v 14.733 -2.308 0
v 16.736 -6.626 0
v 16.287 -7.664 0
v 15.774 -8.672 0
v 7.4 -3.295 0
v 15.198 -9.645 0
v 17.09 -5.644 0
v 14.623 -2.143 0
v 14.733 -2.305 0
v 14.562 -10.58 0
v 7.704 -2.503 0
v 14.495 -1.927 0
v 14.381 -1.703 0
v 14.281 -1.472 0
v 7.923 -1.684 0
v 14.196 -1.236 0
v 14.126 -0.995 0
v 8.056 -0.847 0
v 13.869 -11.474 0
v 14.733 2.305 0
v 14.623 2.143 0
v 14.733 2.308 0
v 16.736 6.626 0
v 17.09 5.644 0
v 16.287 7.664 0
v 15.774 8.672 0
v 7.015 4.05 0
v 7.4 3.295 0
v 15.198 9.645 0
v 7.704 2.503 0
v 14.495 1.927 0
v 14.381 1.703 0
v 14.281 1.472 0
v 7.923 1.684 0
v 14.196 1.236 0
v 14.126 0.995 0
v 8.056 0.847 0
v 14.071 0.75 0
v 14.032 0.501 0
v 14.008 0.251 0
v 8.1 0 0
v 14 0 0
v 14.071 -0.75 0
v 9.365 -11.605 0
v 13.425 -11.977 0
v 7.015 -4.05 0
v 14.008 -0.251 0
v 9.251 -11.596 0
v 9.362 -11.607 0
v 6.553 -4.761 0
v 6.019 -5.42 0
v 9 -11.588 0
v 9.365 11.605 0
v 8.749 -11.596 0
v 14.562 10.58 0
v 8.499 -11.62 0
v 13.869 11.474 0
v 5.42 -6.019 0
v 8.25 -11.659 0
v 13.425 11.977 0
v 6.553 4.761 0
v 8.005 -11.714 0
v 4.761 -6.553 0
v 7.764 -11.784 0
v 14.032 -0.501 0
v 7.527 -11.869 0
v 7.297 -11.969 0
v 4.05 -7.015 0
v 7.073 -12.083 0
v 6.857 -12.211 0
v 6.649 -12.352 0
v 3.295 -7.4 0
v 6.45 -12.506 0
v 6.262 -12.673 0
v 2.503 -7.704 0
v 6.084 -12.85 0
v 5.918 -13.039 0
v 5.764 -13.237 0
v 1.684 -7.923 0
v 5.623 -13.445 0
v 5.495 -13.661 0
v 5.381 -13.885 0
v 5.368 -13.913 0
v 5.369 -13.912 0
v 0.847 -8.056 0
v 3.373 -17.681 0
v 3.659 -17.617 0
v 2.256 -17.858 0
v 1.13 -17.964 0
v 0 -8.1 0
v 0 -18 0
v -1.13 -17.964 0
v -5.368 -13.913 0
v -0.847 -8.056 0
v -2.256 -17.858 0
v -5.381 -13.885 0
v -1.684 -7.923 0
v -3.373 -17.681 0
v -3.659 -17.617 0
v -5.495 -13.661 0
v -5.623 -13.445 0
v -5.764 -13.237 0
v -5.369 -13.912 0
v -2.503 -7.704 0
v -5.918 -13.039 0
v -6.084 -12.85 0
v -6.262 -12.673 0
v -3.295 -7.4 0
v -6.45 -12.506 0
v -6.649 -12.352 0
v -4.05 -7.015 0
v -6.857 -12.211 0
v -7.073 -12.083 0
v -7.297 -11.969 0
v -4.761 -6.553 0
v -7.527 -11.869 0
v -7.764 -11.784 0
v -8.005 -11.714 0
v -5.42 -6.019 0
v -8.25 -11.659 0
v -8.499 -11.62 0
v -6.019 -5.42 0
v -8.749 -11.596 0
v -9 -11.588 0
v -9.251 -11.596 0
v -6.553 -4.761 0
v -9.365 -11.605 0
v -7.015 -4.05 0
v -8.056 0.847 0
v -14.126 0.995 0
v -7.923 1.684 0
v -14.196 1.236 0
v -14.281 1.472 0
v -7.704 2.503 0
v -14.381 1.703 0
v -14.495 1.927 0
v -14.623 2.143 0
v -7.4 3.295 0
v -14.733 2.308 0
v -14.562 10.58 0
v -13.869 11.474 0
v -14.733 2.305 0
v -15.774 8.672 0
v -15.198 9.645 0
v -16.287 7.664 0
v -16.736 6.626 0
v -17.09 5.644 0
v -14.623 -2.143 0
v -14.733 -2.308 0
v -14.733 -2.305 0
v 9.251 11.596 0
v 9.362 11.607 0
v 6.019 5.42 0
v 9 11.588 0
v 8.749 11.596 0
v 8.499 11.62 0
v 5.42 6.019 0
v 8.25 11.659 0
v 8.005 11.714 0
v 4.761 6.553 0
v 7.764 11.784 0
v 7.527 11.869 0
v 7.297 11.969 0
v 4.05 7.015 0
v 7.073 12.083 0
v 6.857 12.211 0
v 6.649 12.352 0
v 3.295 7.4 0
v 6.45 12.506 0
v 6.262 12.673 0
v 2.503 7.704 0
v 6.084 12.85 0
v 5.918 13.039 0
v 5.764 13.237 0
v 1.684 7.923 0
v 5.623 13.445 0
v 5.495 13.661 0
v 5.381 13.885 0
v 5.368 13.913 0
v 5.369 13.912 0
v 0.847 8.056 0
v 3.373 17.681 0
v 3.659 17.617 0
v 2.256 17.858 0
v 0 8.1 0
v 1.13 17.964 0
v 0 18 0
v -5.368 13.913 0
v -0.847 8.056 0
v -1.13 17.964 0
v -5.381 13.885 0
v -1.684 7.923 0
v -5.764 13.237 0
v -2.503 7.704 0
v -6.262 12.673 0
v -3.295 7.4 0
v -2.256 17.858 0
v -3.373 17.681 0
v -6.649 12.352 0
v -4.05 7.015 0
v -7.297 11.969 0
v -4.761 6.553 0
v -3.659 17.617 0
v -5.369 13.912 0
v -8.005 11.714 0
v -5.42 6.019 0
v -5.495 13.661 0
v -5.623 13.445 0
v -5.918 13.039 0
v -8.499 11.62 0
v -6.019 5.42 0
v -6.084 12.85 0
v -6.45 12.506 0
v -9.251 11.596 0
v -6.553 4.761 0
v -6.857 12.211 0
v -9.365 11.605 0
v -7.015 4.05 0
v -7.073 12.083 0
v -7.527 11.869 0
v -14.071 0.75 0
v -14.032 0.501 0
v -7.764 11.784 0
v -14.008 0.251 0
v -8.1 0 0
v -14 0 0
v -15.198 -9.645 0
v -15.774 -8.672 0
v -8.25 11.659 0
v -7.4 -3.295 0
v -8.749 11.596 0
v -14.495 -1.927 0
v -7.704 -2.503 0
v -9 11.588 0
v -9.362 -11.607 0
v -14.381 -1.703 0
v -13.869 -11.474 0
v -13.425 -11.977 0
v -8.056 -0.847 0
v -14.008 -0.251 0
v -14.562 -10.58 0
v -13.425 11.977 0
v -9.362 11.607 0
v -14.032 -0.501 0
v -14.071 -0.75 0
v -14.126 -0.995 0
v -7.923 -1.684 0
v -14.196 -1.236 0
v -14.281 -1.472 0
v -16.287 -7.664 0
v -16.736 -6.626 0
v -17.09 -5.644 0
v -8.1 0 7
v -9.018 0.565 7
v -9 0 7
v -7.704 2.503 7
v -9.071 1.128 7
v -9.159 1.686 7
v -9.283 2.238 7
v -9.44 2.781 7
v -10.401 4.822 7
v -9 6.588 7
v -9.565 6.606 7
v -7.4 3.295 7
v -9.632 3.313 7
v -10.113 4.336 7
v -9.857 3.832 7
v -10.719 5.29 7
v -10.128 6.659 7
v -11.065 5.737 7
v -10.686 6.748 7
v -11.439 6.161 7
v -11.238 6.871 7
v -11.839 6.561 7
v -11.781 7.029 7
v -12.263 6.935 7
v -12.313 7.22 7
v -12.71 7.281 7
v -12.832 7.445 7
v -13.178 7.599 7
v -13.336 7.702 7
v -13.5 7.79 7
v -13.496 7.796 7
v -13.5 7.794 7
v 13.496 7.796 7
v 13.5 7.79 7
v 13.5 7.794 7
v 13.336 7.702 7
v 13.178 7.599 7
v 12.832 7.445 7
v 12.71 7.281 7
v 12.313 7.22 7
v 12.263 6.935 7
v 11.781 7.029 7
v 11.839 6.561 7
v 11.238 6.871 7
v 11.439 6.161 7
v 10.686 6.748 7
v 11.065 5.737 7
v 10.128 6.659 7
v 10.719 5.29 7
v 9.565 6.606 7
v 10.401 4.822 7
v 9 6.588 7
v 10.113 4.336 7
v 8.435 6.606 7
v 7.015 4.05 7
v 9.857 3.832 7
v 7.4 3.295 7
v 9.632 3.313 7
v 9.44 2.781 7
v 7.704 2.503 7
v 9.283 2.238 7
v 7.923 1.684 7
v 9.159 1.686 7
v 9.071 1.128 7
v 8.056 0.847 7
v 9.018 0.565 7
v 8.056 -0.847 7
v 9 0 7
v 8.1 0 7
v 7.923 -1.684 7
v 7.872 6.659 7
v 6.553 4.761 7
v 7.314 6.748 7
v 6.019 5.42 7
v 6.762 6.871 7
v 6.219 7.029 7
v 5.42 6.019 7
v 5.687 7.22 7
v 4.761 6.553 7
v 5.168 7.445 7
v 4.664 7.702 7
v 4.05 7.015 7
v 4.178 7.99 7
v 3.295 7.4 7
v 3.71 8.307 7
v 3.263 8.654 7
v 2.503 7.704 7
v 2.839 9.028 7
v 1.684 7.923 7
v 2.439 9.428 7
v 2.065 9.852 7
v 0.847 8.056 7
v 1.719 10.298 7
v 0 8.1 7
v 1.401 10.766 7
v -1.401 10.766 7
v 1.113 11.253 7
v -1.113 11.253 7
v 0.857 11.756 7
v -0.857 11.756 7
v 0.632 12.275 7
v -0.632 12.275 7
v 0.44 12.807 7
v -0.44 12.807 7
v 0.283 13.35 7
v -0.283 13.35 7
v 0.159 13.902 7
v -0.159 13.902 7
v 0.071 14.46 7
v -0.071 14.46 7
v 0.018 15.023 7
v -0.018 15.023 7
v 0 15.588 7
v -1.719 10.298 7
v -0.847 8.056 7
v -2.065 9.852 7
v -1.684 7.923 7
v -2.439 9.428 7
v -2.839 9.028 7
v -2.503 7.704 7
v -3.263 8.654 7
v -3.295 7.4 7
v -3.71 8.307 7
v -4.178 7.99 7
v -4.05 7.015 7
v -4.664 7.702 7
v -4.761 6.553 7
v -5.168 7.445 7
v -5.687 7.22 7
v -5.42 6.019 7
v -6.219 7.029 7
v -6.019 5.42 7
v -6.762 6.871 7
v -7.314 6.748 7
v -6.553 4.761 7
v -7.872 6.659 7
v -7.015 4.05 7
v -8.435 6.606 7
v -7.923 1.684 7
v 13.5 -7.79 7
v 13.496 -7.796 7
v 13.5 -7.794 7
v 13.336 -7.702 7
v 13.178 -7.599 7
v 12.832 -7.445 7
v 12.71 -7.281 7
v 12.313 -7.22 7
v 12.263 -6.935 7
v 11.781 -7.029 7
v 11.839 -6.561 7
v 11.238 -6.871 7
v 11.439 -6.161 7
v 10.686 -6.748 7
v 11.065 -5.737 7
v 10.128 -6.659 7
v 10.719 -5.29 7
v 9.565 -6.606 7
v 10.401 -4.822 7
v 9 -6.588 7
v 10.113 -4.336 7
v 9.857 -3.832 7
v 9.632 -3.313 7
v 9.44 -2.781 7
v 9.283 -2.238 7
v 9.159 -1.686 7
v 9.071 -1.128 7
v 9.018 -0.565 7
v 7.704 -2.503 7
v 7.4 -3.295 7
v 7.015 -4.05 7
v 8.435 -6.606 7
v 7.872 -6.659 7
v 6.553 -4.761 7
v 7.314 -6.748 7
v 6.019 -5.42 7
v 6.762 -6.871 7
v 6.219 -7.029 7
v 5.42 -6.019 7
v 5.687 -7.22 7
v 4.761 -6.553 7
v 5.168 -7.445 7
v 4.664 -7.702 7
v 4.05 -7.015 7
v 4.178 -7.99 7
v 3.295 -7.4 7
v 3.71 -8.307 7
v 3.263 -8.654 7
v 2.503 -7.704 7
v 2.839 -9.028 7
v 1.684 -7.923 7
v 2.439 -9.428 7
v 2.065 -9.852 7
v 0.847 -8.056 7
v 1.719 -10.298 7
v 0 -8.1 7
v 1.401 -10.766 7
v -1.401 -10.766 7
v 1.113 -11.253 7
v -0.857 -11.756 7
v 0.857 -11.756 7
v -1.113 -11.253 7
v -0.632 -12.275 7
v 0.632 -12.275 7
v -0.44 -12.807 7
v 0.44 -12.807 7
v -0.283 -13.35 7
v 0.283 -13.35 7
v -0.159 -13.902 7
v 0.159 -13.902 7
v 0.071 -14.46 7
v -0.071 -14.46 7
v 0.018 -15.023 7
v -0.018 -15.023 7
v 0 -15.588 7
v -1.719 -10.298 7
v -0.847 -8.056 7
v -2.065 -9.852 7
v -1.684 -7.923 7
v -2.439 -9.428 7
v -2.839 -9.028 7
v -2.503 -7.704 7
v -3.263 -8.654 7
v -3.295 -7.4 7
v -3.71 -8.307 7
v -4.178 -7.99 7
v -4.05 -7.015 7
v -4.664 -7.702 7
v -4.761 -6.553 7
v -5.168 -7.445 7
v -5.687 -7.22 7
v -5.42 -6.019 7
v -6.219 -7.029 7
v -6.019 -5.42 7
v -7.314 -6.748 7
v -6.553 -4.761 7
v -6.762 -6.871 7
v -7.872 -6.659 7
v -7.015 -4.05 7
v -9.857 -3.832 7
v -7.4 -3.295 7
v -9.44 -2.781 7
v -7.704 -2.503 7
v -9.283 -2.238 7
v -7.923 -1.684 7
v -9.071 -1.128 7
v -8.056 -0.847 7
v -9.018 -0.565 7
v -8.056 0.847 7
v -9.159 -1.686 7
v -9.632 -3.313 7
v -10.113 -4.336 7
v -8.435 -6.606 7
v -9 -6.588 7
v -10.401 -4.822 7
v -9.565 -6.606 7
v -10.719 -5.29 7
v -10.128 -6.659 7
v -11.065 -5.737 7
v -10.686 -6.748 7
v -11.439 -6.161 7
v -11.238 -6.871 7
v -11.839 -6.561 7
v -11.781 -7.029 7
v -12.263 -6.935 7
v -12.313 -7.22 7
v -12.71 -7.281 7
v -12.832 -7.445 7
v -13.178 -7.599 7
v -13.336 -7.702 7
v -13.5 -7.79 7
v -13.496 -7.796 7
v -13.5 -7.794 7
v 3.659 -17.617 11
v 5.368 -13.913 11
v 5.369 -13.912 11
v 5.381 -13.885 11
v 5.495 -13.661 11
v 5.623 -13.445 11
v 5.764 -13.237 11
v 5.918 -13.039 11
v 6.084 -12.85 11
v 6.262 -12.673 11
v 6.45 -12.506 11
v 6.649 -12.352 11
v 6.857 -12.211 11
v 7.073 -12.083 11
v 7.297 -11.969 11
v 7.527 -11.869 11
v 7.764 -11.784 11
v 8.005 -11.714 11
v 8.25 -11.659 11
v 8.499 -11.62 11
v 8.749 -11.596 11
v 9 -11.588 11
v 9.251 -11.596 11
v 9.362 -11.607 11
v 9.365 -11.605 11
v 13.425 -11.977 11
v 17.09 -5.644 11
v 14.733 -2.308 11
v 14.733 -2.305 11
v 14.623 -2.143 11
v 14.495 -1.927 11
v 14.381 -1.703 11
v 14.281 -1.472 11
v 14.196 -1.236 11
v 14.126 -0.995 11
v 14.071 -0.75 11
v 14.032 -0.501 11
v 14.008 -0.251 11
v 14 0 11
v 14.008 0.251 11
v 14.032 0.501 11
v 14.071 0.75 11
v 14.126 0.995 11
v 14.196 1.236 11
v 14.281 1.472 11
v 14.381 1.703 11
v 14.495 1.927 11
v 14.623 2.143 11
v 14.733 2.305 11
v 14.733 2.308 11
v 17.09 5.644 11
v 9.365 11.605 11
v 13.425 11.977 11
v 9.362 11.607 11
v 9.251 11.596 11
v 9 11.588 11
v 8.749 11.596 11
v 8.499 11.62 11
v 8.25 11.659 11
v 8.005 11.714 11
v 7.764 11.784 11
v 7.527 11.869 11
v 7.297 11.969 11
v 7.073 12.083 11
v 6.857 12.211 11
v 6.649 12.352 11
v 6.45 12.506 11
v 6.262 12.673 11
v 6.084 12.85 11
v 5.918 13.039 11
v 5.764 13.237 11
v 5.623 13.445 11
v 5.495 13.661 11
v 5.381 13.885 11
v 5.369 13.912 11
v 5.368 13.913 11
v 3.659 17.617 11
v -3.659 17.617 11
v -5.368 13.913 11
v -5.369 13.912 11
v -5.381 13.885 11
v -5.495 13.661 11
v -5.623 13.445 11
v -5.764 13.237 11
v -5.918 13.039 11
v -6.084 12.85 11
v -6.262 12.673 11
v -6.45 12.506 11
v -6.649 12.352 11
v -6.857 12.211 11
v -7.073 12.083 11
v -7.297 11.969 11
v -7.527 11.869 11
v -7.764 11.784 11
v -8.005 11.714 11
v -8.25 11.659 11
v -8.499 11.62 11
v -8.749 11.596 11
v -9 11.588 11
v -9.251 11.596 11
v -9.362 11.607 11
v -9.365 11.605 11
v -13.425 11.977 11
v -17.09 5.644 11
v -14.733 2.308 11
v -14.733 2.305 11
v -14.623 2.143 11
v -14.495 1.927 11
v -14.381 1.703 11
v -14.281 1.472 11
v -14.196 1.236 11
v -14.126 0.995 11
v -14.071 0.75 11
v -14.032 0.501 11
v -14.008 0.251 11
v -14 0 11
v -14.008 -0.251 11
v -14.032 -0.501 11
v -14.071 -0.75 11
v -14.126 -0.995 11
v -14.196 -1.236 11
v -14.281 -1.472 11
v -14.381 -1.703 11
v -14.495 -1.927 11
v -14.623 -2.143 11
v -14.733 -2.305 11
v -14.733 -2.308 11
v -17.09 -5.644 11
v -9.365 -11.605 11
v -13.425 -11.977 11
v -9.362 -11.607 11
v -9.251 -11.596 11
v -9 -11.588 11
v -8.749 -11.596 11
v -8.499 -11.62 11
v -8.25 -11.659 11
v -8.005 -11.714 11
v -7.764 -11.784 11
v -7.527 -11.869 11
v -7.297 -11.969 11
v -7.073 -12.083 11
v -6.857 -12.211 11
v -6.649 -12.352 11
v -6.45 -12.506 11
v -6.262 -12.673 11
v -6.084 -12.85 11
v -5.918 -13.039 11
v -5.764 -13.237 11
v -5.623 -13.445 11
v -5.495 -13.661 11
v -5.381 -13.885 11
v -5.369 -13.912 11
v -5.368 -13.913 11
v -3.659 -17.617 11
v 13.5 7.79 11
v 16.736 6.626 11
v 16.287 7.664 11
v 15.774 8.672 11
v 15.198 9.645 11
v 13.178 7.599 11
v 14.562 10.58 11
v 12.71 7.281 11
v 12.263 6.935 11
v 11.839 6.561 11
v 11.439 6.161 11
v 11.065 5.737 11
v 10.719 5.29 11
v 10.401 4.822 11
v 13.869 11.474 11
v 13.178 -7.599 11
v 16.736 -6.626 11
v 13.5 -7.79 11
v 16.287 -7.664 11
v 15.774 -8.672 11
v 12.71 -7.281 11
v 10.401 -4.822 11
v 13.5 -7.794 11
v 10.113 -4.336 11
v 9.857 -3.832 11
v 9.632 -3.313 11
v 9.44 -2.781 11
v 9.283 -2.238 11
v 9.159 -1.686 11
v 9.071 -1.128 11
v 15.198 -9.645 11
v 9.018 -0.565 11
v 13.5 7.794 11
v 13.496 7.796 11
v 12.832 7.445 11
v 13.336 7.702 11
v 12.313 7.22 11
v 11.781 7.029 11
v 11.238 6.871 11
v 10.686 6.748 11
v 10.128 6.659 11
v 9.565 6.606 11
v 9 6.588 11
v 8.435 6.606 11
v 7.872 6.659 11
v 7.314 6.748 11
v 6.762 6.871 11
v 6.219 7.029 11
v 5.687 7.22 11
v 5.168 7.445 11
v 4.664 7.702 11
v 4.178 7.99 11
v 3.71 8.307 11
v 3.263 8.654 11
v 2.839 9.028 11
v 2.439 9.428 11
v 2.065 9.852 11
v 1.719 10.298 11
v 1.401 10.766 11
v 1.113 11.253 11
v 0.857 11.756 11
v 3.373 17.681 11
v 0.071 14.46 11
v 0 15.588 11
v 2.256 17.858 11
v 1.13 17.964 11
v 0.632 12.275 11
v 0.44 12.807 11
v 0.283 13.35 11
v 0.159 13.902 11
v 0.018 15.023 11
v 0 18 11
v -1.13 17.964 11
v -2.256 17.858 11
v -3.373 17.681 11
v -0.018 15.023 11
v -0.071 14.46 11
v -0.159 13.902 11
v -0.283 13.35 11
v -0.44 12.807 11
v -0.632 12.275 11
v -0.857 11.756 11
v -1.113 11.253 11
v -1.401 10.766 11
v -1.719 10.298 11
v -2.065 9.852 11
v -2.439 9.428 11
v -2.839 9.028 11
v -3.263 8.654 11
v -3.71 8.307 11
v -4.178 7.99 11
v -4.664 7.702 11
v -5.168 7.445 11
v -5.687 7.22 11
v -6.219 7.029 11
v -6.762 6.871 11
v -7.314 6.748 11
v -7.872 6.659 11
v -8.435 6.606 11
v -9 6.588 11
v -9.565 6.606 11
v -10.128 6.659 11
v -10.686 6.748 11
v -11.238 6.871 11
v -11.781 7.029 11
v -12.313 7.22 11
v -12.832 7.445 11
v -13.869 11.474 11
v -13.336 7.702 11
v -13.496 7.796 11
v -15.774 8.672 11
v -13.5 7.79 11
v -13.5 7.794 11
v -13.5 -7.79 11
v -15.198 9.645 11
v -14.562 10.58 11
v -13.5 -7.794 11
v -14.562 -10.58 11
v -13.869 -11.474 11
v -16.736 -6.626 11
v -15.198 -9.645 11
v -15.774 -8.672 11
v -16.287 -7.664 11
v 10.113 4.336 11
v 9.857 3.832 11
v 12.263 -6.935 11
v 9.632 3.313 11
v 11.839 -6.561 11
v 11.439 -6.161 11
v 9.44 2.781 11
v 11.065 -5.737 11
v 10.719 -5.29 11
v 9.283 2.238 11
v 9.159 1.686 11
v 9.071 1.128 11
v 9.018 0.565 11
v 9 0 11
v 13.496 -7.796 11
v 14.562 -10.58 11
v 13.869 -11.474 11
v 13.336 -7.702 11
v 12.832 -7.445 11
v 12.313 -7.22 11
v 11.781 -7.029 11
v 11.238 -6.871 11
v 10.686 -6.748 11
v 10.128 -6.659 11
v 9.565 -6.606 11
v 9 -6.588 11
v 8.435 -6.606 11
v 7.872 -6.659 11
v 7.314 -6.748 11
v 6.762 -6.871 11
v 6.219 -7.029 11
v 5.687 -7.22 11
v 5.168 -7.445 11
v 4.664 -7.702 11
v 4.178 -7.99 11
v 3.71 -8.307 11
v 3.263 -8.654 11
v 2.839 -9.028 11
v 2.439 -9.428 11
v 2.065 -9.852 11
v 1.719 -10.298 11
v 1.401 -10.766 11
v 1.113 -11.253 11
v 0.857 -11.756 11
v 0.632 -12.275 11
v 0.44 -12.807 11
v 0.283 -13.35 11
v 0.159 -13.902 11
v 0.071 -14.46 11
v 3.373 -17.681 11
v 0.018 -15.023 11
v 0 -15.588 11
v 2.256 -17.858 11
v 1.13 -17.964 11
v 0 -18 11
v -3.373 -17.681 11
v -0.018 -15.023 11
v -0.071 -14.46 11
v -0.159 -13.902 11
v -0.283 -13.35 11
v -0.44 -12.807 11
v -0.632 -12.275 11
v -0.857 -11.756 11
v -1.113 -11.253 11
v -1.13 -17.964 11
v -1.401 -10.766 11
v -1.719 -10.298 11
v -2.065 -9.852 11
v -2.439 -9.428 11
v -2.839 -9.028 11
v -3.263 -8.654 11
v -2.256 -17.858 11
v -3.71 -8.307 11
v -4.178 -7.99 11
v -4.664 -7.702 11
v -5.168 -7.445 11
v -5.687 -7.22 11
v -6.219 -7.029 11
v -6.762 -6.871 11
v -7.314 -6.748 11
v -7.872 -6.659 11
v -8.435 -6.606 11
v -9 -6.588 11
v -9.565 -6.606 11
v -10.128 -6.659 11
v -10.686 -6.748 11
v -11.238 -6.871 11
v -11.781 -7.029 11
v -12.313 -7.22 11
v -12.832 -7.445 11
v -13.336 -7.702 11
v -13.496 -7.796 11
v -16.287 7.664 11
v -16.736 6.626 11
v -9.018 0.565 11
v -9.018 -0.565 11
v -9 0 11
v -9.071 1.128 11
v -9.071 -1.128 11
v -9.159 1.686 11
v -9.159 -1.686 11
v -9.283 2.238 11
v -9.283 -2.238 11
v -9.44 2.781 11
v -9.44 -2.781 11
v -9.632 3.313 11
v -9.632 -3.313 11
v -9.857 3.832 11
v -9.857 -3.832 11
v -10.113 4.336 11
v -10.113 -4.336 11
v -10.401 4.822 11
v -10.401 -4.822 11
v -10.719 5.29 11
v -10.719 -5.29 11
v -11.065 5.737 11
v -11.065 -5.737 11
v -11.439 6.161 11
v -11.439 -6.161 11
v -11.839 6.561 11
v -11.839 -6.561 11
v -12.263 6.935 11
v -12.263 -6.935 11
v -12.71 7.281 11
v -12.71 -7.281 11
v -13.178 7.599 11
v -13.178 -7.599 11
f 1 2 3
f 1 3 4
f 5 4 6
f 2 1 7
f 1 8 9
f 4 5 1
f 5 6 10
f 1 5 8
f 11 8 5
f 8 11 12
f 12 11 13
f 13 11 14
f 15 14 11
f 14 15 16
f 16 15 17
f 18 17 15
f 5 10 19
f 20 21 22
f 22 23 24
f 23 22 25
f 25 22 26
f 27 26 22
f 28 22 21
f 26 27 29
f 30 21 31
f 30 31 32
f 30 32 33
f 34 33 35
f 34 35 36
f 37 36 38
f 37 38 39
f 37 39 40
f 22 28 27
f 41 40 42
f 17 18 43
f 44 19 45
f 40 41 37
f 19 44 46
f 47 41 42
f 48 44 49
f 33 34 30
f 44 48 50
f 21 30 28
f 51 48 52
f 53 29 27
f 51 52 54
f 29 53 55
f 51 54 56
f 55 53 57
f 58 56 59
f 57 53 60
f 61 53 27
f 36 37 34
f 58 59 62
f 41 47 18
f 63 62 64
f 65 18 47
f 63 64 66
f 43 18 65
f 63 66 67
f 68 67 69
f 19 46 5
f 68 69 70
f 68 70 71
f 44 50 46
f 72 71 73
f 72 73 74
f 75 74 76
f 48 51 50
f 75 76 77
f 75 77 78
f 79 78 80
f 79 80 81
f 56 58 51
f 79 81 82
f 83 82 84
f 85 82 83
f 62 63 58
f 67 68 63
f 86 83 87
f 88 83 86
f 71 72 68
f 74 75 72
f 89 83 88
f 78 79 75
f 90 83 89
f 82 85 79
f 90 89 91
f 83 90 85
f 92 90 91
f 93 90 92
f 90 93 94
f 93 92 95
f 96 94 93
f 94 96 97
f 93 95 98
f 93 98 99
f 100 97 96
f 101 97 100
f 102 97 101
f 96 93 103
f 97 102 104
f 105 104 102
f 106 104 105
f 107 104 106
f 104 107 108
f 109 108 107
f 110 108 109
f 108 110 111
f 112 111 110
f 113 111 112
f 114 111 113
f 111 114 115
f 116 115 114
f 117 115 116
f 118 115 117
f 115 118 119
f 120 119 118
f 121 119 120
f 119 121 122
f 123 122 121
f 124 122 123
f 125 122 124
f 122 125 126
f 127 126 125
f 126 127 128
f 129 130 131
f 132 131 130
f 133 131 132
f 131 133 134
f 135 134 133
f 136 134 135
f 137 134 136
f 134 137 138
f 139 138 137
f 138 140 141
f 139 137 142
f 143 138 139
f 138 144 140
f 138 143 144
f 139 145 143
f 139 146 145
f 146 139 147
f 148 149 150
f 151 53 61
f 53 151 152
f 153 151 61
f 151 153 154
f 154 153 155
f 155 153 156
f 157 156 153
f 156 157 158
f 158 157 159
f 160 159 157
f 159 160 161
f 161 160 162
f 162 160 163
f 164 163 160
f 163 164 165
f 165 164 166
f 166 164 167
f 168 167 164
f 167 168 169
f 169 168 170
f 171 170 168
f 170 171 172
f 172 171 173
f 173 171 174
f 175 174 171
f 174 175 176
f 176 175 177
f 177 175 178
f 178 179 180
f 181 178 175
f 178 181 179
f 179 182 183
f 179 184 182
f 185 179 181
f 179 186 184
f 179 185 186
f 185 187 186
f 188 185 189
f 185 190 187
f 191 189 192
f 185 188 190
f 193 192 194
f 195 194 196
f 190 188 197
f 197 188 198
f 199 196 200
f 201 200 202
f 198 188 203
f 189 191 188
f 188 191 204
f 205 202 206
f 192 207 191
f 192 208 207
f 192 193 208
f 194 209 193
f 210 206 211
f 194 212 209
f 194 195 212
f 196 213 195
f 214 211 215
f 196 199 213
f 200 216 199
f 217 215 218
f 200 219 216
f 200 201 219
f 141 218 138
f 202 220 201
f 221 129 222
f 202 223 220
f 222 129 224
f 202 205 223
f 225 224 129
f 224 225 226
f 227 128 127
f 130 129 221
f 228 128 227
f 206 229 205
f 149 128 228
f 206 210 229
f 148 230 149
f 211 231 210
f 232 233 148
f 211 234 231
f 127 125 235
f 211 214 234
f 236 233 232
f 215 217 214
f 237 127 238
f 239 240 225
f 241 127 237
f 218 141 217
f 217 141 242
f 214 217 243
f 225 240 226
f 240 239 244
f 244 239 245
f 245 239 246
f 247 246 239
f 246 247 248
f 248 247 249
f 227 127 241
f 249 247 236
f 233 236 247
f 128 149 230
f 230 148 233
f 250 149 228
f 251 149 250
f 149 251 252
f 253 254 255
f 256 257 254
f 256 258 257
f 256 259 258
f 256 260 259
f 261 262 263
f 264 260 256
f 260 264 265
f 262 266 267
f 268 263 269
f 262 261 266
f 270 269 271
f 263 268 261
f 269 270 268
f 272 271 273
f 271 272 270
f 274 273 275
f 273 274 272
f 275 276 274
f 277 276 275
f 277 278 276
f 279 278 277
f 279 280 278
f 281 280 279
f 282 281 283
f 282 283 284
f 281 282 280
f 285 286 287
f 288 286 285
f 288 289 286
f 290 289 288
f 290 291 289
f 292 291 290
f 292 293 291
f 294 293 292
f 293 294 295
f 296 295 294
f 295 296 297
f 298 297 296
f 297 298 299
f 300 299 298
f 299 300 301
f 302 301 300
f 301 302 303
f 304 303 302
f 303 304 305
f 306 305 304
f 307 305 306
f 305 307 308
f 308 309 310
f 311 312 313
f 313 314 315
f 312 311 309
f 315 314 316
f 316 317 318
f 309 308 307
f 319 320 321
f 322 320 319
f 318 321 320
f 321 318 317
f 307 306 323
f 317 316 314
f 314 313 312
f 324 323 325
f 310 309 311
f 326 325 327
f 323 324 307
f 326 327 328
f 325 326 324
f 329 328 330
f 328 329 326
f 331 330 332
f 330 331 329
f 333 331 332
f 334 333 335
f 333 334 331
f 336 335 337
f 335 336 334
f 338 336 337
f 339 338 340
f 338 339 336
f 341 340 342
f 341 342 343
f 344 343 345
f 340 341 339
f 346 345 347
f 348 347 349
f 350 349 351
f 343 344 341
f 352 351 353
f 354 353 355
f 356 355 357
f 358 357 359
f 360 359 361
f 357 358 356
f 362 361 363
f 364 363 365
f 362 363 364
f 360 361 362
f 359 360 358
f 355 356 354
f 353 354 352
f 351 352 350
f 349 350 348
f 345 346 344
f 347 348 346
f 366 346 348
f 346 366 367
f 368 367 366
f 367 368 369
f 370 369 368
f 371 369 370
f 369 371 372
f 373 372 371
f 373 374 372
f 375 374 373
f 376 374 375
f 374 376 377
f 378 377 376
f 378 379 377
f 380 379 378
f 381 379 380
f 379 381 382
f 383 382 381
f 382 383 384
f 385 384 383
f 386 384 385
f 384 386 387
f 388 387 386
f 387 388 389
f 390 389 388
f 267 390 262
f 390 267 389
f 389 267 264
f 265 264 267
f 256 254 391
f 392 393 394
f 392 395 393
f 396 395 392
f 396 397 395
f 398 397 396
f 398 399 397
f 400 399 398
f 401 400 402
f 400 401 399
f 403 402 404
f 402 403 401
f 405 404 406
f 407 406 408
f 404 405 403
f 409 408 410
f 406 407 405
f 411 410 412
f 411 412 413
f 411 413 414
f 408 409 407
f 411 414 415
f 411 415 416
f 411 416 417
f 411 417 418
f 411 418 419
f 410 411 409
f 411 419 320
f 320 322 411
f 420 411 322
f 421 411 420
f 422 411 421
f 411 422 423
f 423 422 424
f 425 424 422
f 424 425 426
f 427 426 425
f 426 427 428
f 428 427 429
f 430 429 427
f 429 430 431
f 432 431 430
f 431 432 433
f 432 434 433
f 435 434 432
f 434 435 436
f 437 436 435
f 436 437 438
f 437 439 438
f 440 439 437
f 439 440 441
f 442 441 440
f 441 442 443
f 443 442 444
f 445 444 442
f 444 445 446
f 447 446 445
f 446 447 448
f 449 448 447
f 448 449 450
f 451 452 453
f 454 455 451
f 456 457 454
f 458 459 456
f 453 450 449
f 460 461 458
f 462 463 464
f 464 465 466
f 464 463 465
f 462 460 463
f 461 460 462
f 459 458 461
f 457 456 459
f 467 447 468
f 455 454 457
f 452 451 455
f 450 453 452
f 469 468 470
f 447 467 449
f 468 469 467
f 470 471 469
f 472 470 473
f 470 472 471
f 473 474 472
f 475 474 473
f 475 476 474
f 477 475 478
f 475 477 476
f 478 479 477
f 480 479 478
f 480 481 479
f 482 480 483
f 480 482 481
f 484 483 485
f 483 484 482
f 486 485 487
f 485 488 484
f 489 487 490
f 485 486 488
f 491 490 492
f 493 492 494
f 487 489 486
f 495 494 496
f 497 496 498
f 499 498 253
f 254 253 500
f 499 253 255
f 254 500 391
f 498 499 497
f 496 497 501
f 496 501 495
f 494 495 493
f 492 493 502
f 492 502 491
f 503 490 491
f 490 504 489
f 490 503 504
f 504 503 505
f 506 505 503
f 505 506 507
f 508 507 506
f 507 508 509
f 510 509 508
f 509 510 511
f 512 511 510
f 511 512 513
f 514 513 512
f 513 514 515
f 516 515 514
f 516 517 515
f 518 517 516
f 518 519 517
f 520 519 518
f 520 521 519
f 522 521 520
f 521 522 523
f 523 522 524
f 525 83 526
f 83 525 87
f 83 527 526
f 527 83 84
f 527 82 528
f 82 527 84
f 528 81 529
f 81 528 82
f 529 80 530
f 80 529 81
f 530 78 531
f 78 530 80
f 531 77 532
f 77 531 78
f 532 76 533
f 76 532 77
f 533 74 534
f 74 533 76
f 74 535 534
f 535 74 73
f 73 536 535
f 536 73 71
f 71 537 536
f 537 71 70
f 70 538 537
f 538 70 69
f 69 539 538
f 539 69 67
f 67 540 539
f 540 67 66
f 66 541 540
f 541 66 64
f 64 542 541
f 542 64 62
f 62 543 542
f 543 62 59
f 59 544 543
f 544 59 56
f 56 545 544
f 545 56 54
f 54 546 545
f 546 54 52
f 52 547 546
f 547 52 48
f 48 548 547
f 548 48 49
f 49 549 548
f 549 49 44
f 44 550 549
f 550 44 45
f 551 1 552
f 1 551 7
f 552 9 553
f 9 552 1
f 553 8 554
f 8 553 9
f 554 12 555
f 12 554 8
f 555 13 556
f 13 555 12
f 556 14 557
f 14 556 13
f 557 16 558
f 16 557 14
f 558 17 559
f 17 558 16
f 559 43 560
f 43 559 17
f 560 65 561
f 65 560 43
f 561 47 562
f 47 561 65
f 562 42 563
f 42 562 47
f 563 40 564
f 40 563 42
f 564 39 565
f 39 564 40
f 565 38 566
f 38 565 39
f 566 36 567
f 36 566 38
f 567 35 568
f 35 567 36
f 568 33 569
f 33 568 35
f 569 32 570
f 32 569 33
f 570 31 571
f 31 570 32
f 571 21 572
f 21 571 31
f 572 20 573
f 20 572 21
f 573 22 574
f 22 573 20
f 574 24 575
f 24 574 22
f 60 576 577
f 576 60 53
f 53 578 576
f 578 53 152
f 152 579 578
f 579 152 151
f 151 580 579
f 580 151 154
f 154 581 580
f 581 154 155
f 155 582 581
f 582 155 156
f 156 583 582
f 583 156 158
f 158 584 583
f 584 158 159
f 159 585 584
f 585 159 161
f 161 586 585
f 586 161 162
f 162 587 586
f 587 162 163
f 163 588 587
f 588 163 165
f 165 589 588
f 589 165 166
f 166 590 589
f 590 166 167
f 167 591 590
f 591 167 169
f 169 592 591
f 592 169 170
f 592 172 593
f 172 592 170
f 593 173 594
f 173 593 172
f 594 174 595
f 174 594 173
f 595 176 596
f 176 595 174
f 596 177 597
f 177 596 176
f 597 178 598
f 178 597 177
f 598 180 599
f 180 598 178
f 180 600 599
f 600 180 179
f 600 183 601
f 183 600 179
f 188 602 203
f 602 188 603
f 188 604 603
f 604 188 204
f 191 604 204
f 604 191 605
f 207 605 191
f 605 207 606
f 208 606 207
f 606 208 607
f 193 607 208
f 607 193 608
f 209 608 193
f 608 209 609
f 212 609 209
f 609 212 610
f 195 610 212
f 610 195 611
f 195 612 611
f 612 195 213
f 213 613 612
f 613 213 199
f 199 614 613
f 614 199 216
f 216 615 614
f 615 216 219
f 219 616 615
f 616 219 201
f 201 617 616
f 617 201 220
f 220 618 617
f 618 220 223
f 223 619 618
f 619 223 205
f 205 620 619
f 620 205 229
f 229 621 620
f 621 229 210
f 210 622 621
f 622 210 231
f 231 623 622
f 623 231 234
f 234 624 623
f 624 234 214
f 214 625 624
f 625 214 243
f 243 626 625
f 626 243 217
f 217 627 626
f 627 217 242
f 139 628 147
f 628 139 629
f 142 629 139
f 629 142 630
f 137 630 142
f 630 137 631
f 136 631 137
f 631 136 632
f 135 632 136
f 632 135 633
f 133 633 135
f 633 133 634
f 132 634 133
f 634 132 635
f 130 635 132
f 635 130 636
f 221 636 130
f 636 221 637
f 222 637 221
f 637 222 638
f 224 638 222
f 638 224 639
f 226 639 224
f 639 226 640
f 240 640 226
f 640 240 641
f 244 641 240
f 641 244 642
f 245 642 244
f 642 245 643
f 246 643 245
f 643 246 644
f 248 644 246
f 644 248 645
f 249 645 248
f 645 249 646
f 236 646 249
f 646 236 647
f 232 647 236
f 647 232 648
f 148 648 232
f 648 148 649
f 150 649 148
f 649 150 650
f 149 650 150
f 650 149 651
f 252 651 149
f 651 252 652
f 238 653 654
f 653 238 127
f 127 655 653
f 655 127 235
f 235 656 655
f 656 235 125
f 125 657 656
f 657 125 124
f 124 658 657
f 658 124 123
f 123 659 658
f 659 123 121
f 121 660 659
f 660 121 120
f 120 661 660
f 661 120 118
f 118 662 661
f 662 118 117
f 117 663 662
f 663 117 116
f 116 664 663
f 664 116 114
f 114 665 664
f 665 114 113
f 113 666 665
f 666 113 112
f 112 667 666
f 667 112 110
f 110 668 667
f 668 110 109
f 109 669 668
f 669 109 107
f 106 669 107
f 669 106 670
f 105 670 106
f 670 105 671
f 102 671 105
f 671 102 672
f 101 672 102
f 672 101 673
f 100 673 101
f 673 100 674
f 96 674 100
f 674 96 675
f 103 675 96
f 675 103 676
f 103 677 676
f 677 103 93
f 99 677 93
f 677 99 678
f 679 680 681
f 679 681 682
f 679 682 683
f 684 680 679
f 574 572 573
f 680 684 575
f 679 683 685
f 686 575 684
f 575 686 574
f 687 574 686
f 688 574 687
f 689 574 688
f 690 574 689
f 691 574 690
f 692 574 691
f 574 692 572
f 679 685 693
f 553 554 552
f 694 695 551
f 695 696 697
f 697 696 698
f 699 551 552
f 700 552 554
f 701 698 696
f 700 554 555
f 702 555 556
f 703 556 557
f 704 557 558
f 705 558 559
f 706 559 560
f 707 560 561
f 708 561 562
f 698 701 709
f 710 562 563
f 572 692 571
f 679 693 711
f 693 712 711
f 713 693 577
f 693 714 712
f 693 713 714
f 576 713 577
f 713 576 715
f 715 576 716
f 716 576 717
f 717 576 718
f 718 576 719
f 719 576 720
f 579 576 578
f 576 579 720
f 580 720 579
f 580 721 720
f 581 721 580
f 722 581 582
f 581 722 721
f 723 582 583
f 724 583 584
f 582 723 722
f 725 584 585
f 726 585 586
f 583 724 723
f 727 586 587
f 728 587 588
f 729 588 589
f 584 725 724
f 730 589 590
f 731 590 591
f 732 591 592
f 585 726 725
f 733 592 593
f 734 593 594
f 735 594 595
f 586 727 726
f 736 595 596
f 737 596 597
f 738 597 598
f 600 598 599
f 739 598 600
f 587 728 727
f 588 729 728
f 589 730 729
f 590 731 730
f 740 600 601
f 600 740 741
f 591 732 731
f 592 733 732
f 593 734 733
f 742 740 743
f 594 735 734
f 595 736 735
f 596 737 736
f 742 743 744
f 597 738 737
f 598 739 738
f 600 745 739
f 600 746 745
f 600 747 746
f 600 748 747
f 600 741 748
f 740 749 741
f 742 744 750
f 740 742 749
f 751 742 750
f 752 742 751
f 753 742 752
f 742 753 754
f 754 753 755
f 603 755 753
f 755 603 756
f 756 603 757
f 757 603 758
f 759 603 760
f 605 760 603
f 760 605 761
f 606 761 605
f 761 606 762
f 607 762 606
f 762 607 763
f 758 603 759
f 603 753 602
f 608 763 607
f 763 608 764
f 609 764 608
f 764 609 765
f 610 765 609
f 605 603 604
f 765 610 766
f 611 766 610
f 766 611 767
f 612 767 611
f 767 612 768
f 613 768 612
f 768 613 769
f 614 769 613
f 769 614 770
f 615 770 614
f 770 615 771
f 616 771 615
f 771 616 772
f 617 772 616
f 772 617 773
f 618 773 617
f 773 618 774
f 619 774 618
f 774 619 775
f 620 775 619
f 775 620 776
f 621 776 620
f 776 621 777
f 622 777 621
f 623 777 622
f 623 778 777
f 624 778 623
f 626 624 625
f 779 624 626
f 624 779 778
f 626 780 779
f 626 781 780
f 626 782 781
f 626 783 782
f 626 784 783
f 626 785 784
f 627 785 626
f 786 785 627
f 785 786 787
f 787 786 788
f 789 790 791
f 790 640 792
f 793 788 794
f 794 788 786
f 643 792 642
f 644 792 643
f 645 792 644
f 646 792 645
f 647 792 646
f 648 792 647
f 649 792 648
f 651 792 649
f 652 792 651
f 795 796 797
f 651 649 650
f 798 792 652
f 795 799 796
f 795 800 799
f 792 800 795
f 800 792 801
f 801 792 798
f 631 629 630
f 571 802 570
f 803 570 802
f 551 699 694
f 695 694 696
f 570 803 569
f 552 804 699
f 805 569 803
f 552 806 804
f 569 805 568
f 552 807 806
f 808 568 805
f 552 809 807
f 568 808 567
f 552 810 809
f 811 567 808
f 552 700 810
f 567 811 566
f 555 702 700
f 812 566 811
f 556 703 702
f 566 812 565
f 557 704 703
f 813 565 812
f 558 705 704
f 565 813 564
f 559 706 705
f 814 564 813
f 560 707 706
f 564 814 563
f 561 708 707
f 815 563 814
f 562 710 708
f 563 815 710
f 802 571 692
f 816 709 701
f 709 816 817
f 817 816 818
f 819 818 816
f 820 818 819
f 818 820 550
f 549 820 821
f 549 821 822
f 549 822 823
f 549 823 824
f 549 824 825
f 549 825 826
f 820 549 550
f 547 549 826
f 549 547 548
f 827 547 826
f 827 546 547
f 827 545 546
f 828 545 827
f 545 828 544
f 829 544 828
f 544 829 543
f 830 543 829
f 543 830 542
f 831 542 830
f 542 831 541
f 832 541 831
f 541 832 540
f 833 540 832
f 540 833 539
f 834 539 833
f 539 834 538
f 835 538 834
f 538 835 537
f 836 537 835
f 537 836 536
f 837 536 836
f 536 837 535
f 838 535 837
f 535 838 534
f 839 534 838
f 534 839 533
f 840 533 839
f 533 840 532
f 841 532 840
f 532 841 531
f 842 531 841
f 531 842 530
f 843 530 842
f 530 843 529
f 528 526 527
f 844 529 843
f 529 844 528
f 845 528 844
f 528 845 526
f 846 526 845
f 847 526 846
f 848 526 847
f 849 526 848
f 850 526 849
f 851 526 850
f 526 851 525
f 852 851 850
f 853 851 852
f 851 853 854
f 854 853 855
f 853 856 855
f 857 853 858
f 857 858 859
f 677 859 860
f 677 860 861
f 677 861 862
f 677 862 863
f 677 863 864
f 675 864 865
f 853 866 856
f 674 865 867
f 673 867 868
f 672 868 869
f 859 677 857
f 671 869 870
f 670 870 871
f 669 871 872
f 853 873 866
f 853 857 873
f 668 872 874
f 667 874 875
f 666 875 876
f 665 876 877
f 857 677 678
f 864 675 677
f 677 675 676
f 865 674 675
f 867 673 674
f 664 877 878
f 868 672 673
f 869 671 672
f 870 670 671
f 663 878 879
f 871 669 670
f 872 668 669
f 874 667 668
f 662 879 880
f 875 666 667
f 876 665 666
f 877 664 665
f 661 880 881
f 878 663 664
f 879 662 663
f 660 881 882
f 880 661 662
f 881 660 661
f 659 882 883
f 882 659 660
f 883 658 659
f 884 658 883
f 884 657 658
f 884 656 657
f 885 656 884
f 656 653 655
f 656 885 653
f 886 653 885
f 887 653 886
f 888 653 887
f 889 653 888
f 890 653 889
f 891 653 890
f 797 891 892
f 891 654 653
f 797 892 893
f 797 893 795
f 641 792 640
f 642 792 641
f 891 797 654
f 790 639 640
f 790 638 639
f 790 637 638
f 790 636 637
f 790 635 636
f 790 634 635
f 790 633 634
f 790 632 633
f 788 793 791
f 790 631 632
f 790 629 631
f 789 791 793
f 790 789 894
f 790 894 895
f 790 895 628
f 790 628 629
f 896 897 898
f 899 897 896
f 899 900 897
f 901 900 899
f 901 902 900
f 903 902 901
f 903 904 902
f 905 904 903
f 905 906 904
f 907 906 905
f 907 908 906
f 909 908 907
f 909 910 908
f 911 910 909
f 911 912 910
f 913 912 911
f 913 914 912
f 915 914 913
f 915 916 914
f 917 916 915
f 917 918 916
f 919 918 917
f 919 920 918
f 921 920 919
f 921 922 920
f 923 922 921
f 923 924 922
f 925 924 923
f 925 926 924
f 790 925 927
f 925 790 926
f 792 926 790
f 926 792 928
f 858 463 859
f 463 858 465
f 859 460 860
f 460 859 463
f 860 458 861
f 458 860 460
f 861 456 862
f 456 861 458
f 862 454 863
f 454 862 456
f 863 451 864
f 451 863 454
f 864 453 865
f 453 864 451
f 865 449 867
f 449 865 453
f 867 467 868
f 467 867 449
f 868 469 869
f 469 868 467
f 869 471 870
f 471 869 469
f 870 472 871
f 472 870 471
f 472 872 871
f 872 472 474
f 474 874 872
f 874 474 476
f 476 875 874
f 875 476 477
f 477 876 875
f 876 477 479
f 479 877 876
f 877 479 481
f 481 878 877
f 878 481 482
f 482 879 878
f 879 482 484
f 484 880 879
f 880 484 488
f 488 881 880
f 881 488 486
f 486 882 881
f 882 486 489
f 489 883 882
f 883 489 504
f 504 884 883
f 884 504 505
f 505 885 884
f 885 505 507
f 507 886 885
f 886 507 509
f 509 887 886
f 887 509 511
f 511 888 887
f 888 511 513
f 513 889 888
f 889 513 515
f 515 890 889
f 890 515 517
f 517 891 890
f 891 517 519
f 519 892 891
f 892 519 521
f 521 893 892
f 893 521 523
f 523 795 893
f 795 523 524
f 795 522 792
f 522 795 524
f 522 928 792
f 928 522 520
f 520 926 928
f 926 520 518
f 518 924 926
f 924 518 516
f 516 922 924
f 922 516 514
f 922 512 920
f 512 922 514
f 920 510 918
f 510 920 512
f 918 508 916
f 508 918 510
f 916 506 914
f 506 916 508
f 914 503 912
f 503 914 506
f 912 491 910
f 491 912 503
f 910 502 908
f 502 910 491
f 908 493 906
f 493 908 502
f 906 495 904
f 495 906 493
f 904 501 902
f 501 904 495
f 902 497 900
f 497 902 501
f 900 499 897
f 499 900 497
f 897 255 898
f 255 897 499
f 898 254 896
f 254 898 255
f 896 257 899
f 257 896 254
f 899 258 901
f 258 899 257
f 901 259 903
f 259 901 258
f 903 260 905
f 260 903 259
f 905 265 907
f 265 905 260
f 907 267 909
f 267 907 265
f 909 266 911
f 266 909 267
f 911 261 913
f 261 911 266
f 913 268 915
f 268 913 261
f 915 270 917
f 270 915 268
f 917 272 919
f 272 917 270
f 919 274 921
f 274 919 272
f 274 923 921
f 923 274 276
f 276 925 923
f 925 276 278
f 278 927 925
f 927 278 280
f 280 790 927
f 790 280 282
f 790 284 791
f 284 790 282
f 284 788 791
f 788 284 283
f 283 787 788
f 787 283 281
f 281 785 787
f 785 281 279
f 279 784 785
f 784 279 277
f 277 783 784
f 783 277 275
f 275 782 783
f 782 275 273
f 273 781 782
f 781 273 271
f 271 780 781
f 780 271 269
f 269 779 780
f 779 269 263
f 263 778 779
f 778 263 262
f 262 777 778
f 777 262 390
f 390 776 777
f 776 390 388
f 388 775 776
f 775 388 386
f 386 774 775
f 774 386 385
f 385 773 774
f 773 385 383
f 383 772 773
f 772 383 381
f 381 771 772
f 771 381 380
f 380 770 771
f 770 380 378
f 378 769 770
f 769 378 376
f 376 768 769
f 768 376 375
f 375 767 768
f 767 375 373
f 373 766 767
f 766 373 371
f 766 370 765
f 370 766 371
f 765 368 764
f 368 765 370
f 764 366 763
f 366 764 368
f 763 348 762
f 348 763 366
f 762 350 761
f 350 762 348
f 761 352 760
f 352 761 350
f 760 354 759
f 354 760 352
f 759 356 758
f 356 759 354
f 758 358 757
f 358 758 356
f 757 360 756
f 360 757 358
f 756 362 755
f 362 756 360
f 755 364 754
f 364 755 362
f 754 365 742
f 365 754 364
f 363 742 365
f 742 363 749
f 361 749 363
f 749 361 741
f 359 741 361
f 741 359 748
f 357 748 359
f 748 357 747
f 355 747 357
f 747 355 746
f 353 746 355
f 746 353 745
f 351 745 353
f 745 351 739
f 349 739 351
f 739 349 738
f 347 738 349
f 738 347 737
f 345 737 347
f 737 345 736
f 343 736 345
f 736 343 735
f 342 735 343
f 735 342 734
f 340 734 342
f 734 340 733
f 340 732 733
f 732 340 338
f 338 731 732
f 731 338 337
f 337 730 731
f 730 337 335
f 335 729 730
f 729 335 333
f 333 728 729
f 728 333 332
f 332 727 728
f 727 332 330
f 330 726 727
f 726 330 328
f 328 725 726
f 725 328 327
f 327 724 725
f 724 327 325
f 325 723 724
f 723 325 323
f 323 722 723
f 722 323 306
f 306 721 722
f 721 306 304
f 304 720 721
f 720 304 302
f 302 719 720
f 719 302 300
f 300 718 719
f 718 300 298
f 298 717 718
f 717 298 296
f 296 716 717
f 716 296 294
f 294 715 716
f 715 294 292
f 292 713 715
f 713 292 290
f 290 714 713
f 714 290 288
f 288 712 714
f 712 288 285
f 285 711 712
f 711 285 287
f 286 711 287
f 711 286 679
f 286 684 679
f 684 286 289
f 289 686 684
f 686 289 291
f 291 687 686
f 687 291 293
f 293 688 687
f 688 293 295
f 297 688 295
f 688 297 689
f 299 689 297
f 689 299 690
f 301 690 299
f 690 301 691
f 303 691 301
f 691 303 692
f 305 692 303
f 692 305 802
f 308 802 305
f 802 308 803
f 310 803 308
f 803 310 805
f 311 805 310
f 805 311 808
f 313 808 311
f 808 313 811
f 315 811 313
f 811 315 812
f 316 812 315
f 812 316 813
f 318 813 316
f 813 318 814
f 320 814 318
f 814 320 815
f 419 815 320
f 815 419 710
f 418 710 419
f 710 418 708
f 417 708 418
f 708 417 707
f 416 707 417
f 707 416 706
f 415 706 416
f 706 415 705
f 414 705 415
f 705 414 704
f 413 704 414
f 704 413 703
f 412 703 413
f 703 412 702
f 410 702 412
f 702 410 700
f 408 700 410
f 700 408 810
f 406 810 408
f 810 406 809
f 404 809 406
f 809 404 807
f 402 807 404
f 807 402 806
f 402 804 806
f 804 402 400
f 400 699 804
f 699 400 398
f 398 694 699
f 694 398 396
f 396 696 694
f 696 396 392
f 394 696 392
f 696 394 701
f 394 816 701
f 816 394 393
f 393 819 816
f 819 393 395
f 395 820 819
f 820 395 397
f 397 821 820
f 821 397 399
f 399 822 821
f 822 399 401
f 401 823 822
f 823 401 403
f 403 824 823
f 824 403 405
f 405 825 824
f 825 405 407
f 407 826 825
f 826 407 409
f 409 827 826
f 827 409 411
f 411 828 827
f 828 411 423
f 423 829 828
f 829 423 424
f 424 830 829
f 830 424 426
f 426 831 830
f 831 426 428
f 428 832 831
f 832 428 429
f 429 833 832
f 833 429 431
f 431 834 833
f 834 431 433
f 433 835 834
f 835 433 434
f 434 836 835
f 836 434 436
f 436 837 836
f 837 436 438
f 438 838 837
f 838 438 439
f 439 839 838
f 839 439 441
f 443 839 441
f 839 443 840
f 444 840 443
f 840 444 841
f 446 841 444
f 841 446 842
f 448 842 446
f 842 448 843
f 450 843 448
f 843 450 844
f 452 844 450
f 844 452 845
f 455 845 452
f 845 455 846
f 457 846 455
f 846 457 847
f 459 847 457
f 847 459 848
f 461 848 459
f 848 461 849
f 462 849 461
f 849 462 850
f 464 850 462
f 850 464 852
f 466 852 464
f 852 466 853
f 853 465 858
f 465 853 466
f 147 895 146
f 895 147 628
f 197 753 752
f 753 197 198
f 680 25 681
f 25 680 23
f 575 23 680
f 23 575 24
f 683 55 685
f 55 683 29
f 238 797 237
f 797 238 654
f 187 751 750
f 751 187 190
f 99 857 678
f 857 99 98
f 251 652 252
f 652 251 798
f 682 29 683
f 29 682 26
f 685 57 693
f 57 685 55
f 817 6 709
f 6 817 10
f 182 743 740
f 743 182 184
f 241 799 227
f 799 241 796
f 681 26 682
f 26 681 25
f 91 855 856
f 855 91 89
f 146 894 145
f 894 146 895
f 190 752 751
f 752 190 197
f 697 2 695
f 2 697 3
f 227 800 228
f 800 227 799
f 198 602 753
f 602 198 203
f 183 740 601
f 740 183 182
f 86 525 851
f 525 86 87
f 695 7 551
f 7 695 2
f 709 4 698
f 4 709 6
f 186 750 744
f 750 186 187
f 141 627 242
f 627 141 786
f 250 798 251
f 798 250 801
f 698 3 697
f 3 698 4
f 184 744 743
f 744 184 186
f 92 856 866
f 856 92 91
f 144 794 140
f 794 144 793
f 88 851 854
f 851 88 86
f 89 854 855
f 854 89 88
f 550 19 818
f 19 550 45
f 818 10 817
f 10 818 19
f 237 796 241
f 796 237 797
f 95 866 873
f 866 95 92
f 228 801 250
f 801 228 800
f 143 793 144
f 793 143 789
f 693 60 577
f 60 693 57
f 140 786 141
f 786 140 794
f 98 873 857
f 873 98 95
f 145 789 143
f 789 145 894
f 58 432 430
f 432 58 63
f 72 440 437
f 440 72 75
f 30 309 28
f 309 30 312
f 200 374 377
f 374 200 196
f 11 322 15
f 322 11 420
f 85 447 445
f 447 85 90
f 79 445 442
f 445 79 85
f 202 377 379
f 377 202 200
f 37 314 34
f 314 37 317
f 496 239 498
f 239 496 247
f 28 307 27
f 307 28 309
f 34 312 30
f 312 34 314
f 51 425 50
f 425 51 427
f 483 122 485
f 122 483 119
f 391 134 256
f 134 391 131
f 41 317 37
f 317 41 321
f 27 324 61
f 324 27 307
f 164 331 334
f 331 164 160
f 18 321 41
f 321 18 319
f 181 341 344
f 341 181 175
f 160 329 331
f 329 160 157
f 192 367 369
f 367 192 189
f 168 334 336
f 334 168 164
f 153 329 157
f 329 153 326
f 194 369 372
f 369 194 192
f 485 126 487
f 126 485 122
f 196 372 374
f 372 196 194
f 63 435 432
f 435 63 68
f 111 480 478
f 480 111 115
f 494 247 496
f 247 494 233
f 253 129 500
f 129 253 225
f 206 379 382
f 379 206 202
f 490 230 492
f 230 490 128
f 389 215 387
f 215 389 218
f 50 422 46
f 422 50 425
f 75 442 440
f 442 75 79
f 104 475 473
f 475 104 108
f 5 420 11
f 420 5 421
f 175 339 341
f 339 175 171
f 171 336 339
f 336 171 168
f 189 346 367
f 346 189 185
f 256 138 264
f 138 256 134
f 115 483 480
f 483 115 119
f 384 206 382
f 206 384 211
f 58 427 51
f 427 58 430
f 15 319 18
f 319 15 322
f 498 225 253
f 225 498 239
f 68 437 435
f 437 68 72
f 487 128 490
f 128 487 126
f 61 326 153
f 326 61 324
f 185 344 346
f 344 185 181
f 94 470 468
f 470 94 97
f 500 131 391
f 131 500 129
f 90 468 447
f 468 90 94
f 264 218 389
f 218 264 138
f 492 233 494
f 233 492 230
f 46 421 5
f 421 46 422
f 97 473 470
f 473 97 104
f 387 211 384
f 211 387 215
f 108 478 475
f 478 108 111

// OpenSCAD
// file: ../common/shapes.scad
/*
  author: Christopher O'Brien  <obriencj@gmail.com>
  license: GPL v3
*/


function shared_tangents(p1, p2) =
    let(r1 = p1[2],
        r2 = p2[2],
        dx = p2.x - p1.x,
        dy = p2.y - p1.y,
        d = sqrt(dx * dx + dy * dy),
        theta = atan2(dy, dx) + acos((r1 - r2) / d),
        xa = p1.x +(cos(theta) * r1),
        ya = p1.y +(sin(theta) * r1),
        xb = p2.x +(cos(theta) * r2),
        yb = p2.y +(sin(theta) * r2))
     [ [xa, ya], [xb, yb] ];



module _rounded_polygon(points, $fn=100) {
/*
  each point is [x, y, r] of a circle

  adapted from
  http://forum.openscad.org/Script-to-replicate-hull-and-minkoswki-for-CSG-export-import-into-FreeCAD-td16537.html#a16556
*/

     p_len = len(points);

     function p_tang(index) =
	  shared_tangents(points[index], points[(index + 1) % p_len]);

     // all the positive radius circles
     for(p = points) {
	  if(p[2] > 0) {
	       translate([p.x, p.y]) {
		    circle(p[2]);
	       };
	  };
     };

     difference() {
	  // a polygon connecting the tangent points between all
	  // circles in order
	  polygon([for(i = [0: p_len - 1]) for(e = p_tang(i)) e]);

	  // then subtract all the negative radius circles
	  for(p = points) {
	       if(p[2] < 0) {
		    translate([p.x, p.y]) {
			 circle(-p[2]);
		    };
	       };
	  };
     };
}


module rounded_polygon(points, thick=0, $fn=100) {
     /*
       each point in points is a vector of [x, y, r] where r is
       positive to indicate that it is an interior point, and negative
       to indicate it is an exterior point.
     */

     if(thick) {
	  linear_extrude(thick) {
	       _rounded_polygon(points, $fn);
	  };
     } else {
	  _rounded_polygon(points, $fn);
     };
}


function _r_adj(r, adj) =
     let(ra = r + adj) (r > 0)? max(0, ra): ra;


function adj_rounded_poly(points, adj) =
     [for(p=points) [p.x, p.y, _r_adj(p[2], adj)]];


module rounded_inset_poly(points, inset, thick, lip=undef) {
     tl = lip? (thick - lip): (thick / 2);

     rounded_polygon(points, tl);
     translate([0, 0, tl]) {
	  rounded_polygon(adj_rounded_poly(points, -inset),
			  thick - tl);
     };
}


module rounded_outset_poly(points, inset, thick, lip=undef) {
     tl = lip? (thick - lip): (thick / 2);

     rounded_polygon(points, tl);
     rounded_hollow_poly(points, inset, thick);
}


module rounded_hollow_poly(points, inset, thick) {
     linear_extrude(thick) {
	  difference() {
	       rounded_polygon(points);
	       rounded_polygon(adj_rounded_poly(points, -inset));
	  };
     };
}


/**
   A cylinder with a bore through it

   * barrel_r is the exterior radius
   * barrel_h is the overall height
   * bore_r is the interior radius
*/
module barrel(barrel_r, barrel_h, bore_r, $fn=100) {
     linear_extrude(barrel_h) {
	  difference() {
	       circle(barrel_r);
	       circle(bore_r);
	  };
     };
}


/**
   A ring with a circular profile.

   * ring_ir is the interior radius
   * cross_r is the radius of the cross-section
*/
module o_ring(ring_ir, cross_r, $fn=100) {
     rotate_extrude(angle=360) {
	  translate([ring_ir + cross_r, 0, 0]) {
	       circle(cross_r);
	  };
     };
}


/**
   A ring with a D shaped profile.

   * ring_ir is the interior radius
   * cross_r is the radius of the cross-section, before being affected
   by the factor.
   * The factor describes how much of a circle is being presented in
   the cross-section. A factor of 1 is equivalent of an oring.
*/
module d_ring(ring_ir, cross_r, factor=0.25, $fn=100) {

     factor_shift = (cross_r * 2 * factor) - cross_r;

     rotate_extrude(angle=360) {
	  difference() {
	       translate([ring_ir + factor_shift , 0, 0]) {
		    circle(cross_r);
	       };
	       square([ring_ir * 2, ring_ir * 2], true);
	  };
     };
}



module rounded_plate(width, depth, height, turn_r=5.1, $fn=50) {
     turn_d = turn_r * 2;

     translate([turn_r, turn_r, 0]) {
	  linear_extrude(height) {
	       minkowski() {
		    square([width - turn_d, depth - turn_d]);
		    circle(turn_r);
	       };
	  };
     };
}


module rounded_box(width, depth, height, turn_r=5, $fn=50) {
     turn_d = turn_r * 2;

     translate([turn_r, turn_r, turn_r]) {
	  minkowski() {
	       cube([width - turn_d, depth - turn_d, height - turn_d]);
	       sphere(turn_r);
	  };
     };
}


// The end.
// file: ../common/copies.scad
/*
  author: Christopher O'Brien  <obriencj@gmail.com>
  license: GPL v3
*/


module copy_mirror(plane=[0, 0, 1]) {
     children();
     mirror(plane) children();
}


module copy_translate(x=0, y=0, z=0, copies=1) {
     if(copies) {
	  for(i = [0:copies]) {
	       translate([x * i, y * i, z * i]) {
		    children();
	       };
	  };
     } else {
	  children();
     };
}


module copy_rotate(x=0, y=0, z=0, copies=1) {
     if(copies) {
	  for(i = [0:copies]) {
	       rotate([x * i, y * i, z * i]) {
		    children();
	       };
	  };
     } else {
	  children();
     };
}


module copy_grid(offsets=[0, 0, 0], grid=[1, 1, 1]) {
     copy_translate(x=offsets.x, copies=grid.x-1) {
	  copy_translate(y=offsets.y, copies=grid.y-1) {
	       copy_translate(z=offsets.z, copies=grid.z-1) {
		    children();
	       };
	  };
     };
}


module duplicate(move_v=[0,0,0], rotate_v=[0,0,0]) {
     children();
     translate(move_v) {
	  rotate(rotate_v) {
	       children();
	  };
     };
}


// The end.
// main file
use <../common/copies.scad>;
use <../common/shapes.scad>;


function ring_hole_count(ring_r, hole_r) =
     let(inside_r = ring_r - hole_r,
         theta = asin(hole_r / (hole_r + inside_r)),
         count = floor(180 / theta))
     count;


function rotate_point(p, angle, c=[0, 0]) =
     [cos(angle) * (p.x - c.x) - sin(angle) * (p.y - c.y) + c.x,
      sin(angle) * (p.x - c.x) + cos(angle) * (p.y - c.y) + c.y,
      p[2]];


function knob_points(r1=20, r2=14, c=4, steps=6) =
     let(space = (r1 + r2) / steps,
	 o_ths = -360 / steps,
	 i_ths = o_ths / 2,
	 outie = [0, r1 - c, c],
	 innie = [0, r2 + c, -c])
     [for(i=[1:steps])
	       let(step_angle = o_ths * i)
		    for(p=[rotate_point(outie, step_angle),
			   rotate_point(innie, step_angle + i_ths)])
			 p];


module bolt_knob(thick=10, recess=4, bolt_r=3.1, hex_r=5.8, proud=2,
		 r1=20, r2=14, r3=18, c=4, steps=6) {
     difference() {
	  intersection() {
	       rounded_outset_poly(knob_points(r1, r2, c, steps),
				   5, thick, recess);
	       cylinder(thick, r=r3, $fn=100);
	  };
	  translate([0, 0, -1]) {
	       cylinder(recess + 1, r=hex_r, $fn=6);
	  };
	  translate([0, 0, -1]) {
	       cylinder(thick, r=bolt_r, $fn=60);
	  };
     };
     translate([0, 0, thick - recess]) {
	  barrel(hex_r, recess + proud, bolt_r);
     };
}


module smooth_inset(inner_r, outer_r, inset, inner_inset=0, $fn=100) {

     space = outer_r - inner_r;
     mid_r = inner_r + (space / 2);

     curve_r = space / 4;
     place_off = curve_r / 6;

     small_r = curve_r - place_off;
     big_r = curve_r + place_off;

     points = [[0, -inner_inset, 0],
	       [0, 1, 0],
	       [mid_r, big_r - inset, big_r],
	       [outer_r + 1, 1, 0],
	       [outer_r + 1, 0, 0],
	       [outer_r, -small_r, -small_r],
	       [mid_r, big_r - inset, big_r],
	       [inner_r, -small_r - inner_inset, -small_r]];


     rotate_extrude(angle=360) {
	  rounded_polygon(points);
     };
}


module better_knob(thick, hex_recess, hex_r, bolt_r,
		   outer_r, inner_r=0, grip_r=0, grip_gap=0,
		   hex_inset=0, smooth_inset=0) {

     inner_r_ = inner_r? inner_r: outer_r - 5;
     grip_r_ = grip_r? grip_r: (outer_r - inner_r_) * 2;
     grip_gap_ = grip_gap? grip_gap: grip_r_ / 4;

     // the radius we'll place the subtracted circles at, which is
     // just the inner radius plus the radius of the circles
     ring_r = inner_r_ + grip_r_;

     grip_count = ring_hole_count(ring_r, grip_r_ + grip_gap_);
     grip_degrees = 360 / grip_count;

     difference() {
	  linear_extrude(thick) {
	       difference() {
		    circle(outer_r, $fn=100);

		    circle(bolt_r, $fn=80);

		    copy_rotate(z=grip_degrees, copies=(grip_count - 1)) {
			 translate([0, ring_r]) {
			      circle(grip_r_, $fn=80);
			 };
		    };
	       };
	  };

	  if(smooth_inset) {
	       translate([0, 0, thick]) {
		    smooth_inset(hex_r + 4, inner_r_ - 4, smooth_inset,
				 inner_inset=hex_inset);
	       };

	  } else {
	       if(hex_inset) {
		    translate([0, 0, thick - hex_inset]) {
			 linear_extrude(hex_inset + 1) {
			      circle(hex_r + 2, $fn=80);
			 };
		    };
	       };
	  };
	  translate([0, 0, thick - (hex_recess + hex_inset)]) {
	       linear_extrude(hex_recess + hex_inset + 1) {
		    circle(hex_r, $fn=6);
	       };
	  };
     };
}


bolt_knob(11, 4, bolt_r=16.2/2, hex_r=9.2/2, proud=1);


// The end.
